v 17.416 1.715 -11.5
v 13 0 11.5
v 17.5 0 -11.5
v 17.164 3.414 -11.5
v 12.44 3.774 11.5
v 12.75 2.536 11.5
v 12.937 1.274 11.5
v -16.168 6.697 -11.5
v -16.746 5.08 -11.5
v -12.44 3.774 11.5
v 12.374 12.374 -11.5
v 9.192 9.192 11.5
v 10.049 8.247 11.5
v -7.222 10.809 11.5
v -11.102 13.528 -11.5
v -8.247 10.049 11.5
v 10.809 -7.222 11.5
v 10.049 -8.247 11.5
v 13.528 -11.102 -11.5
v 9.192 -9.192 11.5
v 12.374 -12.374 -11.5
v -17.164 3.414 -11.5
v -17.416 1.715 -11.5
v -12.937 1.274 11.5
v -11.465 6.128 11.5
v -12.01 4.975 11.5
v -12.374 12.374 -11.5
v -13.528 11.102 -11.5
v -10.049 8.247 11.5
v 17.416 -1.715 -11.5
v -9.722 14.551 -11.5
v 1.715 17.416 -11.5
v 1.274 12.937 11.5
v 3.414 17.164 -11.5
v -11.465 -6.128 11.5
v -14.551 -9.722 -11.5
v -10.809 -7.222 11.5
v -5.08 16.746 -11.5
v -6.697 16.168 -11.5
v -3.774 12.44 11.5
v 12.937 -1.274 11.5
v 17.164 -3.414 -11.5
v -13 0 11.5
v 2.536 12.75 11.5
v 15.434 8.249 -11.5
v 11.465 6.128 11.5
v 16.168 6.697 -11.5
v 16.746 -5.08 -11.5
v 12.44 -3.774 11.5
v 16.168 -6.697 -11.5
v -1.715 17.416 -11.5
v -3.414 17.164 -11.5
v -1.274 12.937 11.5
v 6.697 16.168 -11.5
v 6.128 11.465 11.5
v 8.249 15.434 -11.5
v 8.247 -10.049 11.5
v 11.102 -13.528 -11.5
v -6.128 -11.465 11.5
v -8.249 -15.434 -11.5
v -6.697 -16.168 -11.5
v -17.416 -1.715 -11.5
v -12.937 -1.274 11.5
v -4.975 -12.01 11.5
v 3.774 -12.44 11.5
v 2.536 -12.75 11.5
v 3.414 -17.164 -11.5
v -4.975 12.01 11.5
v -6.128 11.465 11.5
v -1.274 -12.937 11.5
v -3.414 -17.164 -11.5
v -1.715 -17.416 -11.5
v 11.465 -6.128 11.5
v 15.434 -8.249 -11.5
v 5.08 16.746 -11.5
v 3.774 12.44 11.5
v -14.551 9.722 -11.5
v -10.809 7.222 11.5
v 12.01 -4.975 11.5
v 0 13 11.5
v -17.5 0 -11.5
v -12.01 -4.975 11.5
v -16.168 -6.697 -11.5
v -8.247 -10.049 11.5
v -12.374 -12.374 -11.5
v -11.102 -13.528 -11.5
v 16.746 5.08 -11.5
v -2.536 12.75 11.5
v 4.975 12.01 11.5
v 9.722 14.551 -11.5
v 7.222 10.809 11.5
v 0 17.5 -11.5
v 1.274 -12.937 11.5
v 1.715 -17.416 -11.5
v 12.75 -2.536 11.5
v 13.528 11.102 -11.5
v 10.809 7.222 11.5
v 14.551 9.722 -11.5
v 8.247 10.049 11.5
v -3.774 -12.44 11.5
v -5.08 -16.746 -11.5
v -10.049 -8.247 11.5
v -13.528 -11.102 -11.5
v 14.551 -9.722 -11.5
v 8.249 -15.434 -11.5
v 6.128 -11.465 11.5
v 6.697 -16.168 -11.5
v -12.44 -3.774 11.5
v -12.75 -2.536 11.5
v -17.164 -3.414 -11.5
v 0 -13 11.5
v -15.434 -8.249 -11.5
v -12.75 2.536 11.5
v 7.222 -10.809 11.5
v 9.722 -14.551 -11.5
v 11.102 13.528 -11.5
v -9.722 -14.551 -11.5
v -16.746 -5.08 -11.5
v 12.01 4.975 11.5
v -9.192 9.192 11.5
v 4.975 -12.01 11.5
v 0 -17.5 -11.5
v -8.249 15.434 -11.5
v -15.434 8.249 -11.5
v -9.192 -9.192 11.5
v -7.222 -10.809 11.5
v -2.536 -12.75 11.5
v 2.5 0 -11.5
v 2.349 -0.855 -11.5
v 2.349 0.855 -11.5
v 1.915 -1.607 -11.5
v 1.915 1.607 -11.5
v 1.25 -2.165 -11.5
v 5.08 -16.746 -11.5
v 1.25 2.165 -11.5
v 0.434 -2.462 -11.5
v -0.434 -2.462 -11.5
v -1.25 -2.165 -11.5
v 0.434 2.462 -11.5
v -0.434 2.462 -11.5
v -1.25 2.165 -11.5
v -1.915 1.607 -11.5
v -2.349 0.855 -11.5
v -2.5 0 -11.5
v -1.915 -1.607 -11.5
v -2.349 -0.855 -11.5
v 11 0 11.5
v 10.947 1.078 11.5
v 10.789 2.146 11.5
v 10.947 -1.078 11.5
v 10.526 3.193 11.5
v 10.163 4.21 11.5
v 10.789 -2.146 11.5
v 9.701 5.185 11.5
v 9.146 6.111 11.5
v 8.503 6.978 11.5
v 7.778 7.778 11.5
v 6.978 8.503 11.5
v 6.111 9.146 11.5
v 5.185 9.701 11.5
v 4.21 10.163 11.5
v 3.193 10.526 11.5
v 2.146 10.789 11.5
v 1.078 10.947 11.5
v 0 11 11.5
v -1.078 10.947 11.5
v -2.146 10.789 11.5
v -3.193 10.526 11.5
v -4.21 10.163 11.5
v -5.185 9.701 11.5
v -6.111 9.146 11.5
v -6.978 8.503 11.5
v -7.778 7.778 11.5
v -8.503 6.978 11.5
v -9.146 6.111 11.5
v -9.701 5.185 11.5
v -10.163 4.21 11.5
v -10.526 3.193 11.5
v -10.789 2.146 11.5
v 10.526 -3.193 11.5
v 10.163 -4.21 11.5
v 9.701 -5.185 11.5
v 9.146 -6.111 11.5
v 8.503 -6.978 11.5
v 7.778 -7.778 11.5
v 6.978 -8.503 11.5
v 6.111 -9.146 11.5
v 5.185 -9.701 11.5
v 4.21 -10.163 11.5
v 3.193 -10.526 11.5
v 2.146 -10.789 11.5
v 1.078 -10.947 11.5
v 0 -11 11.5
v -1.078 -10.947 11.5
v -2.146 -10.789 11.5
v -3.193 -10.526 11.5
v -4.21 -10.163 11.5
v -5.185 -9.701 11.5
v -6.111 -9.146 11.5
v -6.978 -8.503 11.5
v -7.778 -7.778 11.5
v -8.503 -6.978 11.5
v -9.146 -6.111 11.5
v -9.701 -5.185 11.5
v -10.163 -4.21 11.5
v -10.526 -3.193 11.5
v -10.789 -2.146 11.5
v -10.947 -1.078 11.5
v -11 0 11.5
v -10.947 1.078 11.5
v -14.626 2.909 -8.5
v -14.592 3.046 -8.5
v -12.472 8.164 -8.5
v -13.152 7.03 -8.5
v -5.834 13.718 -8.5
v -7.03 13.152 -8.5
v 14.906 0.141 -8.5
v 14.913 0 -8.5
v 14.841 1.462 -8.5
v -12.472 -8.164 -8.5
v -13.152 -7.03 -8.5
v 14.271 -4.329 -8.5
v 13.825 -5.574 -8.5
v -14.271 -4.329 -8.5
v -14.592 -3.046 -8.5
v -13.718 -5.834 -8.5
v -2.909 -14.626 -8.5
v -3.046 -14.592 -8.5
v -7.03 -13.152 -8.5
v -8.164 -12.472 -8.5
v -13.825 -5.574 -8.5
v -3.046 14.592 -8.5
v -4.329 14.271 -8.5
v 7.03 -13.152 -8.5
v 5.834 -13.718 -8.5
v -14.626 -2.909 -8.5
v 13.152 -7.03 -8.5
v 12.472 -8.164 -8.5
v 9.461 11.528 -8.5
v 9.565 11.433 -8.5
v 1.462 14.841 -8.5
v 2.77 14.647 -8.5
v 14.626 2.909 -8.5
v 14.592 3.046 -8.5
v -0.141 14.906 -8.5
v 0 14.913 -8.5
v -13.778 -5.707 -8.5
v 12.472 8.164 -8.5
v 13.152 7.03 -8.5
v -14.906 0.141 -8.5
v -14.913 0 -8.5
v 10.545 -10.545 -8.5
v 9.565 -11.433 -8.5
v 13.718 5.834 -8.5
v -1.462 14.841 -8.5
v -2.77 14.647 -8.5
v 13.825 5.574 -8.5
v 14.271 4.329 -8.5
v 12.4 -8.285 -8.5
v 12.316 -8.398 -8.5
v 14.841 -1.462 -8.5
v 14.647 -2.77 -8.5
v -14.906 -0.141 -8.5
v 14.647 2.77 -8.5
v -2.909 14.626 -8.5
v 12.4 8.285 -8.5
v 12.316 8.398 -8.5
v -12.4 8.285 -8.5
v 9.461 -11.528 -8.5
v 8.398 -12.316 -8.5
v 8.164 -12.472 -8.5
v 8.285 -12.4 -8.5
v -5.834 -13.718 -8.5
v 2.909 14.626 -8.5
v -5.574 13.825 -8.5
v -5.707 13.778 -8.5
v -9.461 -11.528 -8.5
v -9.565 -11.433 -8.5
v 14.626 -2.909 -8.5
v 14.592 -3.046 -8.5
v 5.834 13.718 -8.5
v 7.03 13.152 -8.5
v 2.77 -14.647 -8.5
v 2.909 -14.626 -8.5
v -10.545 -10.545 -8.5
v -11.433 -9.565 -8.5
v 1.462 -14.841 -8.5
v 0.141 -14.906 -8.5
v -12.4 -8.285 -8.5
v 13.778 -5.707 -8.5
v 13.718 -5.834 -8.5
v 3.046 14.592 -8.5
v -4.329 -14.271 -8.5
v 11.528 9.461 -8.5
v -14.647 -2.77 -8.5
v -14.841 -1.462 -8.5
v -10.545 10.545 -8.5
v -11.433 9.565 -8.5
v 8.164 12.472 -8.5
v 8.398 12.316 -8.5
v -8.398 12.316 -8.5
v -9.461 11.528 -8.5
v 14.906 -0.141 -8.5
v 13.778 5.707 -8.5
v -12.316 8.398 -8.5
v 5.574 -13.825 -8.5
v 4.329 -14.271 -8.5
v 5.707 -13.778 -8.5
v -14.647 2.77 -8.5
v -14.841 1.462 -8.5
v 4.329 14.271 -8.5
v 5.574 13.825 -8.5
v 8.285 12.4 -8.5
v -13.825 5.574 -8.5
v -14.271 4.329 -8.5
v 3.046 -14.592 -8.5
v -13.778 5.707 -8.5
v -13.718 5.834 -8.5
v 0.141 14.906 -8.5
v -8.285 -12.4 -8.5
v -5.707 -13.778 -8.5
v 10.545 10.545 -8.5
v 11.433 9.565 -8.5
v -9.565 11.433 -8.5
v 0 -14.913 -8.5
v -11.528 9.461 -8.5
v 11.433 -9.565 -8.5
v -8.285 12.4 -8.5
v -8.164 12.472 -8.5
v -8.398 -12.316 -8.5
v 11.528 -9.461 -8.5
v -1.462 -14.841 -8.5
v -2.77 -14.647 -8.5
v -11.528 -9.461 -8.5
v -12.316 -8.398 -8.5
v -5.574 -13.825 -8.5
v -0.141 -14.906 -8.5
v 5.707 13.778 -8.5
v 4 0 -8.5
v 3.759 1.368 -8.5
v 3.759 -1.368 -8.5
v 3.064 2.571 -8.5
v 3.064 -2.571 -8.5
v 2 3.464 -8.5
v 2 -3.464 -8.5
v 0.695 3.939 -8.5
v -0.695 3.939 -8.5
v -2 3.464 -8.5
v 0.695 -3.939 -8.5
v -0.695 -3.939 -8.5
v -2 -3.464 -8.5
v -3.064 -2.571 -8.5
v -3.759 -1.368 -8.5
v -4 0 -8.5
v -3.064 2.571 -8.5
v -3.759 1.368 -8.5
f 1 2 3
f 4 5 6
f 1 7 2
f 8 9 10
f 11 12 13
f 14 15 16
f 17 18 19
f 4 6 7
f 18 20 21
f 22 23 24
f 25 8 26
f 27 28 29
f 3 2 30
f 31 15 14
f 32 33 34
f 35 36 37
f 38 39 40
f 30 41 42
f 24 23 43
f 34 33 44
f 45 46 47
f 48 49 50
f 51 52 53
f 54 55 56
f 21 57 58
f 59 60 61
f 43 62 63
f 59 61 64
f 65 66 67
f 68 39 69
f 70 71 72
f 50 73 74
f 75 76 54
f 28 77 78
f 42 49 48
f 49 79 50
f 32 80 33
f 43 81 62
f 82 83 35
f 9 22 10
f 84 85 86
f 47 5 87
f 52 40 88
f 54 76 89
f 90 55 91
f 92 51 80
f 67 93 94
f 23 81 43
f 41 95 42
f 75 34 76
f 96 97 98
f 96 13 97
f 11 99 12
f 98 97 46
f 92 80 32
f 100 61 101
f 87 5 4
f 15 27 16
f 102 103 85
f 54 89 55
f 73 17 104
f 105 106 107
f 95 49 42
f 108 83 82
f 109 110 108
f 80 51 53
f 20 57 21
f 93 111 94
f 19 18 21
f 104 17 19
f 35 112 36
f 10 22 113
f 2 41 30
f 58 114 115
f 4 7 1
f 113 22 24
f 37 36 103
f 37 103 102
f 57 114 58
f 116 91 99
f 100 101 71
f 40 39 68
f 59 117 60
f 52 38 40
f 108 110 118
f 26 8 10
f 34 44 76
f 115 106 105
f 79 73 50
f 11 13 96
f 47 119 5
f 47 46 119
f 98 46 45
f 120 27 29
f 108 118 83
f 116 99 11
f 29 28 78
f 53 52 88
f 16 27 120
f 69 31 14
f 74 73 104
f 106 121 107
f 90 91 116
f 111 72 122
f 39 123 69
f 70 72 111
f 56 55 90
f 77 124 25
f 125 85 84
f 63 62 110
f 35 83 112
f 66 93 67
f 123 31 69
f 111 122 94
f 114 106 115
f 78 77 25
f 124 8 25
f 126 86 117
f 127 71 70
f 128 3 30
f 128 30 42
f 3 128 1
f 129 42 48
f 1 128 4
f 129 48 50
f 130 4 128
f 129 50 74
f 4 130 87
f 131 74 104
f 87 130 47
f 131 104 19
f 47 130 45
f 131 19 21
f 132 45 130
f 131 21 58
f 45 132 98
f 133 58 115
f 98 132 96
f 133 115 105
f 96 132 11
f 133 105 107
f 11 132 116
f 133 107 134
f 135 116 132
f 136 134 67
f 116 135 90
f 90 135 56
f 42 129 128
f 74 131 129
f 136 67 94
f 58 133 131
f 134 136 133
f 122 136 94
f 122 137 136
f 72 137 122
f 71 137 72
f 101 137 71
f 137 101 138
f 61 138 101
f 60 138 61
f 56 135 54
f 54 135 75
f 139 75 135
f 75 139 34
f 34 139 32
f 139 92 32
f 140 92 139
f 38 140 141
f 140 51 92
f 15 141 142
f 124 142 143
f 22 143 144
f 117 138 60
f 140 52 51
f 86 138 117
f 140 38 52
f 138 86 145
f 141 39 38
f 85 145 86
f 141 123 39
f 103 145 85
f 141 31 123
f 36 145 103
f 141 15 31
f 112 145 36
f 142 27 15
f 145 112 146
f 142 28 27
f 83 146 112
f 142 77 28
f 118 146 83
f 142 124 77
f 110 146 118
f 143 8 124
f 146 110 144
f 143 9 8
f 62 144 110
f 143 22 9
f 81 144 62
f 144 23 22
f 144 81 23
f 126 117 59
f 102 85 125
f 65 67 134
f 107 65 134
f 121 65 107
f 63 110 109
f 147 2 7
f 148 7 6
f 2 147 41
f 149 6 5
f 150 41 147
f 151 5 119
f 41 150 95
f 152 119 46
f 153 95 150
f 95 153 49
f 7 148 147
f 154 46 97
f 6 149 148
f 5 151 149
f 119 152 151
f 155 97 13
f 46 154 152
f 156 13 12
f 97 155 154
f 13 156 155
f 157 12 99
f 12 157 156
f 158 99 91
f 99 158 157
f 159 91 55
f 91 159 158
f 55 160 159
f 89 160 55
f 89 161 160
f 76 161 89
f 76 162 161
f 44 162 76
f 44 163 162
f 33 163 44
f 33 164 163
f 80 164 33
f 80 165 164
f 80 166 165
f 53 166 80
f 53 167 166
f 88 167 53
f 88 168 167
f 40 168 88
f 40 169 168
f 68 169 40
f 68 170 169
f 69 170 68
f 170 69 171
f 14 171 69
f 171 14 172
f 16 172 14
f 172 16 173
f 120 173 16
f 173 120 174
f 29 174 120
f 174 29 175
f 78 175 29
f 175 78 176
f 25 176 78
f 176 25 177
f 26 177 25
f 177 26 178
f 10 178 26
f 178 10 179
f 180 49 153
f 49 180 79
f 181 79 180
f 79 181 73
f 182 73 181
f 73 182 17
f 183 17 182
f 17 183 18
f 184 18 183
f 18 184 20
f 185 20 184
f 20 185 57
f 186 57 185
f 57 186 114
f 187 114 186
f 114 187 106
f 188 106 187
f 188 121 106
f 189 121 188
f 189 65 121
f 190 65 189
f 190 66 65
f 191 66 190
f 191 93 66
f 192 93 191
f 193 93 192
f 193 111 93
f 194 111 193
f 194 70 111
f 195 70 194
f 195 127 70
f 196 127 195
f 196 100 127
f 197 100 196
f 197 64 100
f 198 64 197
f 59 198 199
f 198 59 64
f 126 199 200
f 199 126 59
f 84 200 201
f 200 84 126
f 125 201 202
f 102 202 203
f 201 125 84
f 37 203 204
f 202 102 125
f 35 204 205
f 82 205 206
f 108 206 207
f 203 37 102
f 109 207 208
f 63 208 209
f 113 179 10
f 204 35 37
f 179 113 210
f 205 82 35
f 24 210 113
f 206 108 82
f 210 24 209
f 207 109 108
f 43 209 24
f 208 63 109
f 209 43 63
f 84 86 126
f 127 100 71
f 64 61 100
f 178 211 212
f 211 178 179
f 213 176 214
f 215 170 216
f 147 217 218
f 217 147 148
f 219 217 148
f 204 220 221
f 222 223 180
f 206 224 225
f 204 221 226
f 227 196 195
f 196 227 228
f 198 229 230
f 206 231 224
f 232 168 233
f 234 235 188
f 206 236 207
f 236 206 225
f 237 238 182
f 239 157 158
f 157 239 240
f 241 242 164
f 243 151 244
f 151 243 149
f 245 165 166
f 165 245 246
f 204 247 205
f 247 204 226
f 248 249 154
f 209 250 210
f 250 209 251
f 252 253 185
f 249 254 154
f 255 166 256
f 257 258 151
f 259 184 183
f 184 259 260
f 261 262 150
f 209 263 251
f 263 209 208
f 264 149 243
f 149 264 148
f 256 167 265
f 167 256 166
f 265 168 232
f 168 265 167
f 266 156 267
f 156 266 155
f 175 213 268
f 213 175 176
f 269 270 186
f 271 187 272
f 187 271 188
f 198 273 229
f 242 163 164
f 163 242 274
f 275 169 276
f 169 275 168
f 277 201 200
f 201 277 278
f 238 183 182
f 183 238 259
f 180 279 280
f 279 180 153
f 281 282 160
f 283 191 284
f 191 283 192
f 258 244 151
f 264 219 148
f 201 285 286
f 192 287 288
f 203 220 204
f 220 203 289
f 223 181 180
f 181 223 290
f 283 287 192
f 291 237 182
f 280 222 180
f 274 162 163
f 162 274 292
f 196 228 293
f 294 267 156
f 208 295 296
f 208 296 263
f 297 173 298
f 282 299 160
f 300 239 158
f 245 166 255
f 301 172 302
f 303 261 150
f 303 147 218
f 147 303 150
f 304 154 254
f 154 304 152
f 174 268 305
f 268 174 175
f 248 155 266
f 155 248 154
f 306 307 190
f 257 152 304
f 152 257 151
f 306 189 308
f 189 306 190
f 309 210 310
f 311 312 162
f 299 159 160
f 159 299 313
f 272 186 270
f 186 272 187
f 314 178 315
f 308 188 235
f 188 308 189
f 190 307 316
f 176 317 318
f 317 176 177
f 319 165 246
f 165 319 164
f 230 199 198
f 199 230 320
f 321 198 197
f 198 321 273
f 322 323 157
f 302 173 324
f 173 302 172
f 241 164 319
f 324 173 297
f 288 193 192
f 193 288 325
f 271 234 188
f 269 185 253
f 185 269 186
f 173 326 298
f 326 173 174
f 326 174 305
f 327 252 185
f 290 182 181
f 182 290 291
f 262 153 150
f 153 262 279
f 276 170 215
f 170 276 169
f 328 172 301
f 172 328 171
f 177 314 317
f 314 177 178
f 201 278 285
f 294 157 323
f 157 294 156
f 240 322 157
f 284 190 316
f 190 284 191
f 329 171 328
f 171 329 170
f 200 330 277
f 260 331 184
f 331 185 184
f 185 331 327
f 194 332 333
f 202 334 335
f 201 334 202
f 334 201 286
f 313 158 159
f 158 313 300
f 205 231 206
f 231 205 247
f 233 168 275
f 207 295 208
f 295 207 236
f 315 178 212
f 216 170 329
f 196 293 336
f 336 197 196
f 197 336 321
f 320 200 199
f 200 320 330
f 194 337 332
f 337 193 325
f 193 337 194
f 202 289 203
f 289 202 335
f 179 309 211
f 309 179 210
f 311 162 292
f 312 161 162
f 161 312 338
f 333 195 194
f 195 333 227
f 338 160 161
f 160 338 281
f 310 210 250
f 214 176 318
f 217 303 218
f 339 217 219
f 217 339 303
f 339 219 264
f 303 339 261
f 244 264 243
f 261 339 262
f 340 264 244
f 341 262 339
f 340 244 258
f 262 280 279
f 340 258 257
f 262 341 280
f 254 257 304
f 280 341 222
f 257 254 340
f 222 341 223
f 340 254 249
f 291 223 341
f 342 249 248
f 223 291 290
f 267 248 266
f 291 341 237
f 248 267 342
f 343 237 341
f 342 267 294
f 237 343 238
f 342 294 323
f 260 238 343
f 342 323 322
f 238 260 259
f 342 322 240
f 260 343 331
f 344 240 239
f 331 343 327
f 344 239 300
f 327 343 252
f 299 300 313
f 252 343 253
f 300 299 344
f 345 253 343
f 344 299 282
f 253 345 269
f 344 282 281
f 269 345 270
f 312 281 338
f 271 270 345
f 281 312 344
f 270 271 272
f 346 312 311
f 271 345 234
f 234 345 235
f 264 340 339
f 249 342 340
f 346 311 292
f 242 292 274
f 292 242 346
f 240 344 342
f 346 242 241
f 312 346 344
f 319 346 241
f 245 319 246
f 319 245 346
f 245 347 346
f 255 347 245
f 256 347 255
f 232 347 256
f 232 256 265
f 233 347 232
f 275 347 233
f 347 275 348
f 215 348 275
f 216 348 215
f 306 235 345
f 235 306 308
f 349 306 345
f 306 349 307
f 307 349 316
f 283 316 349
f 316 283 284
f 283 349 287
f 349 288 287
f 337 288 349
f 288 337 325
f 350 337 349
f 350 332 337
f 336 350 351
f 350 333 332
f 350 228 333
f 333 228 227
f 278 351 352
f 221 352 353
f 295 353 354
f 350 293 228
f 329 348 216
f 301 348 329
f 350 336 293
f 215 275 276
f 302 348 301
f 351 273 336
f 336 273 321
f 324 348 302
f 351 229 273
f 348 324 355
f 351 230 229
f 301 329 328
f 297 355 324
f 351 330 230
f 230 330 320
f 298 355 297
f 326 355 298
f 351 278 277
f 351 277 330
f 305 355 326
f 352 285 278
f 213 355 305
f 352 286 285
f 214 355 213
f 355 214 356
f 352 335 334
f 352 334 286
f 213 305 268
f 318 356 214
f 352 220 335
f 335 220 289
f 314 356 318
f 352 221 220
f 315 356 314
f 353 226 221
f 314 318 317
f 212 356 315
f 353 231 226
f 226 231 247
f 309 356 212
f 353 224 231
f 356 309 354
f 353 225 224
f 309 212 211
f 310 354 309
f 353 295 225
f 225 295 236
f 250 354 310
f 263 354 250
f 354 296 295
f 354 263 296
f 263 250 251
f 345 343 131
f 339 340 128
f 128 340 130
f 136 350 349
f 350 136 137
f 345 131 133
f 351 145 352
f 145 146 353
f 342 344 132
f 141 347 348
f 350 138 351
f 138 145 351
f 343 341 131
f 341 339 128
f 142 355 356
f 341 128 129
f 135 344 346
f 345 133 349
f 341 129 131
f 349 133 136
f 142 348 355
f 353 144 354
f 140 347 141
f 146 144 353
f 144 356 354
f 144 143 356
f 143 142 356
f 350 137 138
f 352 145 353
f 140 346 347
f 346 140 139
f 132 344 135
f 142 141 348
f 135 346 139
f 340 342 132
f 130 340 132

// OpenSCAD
cup();

module cone()
{
    difference() 
	{
    		cylinder(h = 23, r1 = 17.5, r2 = 13, center = true, $fn = 64);
    		cylinder(h = 23, r1 = 15.5, r2 = 11, center = true, $fn = 64);
	}
}

module base()
{
    translate([0, 0, -10])
		difference()
		{
    			cylinder(h = 3, r1 = 17, r2 = 16.5, center = true, $fn = 18);
			cylinder(h = 3, r1 = 2.5, r2 = 4, center = true, $fn = 18);
		}
}

module cup()
{
	union()
	{
		cone();
		base();
	}
}
